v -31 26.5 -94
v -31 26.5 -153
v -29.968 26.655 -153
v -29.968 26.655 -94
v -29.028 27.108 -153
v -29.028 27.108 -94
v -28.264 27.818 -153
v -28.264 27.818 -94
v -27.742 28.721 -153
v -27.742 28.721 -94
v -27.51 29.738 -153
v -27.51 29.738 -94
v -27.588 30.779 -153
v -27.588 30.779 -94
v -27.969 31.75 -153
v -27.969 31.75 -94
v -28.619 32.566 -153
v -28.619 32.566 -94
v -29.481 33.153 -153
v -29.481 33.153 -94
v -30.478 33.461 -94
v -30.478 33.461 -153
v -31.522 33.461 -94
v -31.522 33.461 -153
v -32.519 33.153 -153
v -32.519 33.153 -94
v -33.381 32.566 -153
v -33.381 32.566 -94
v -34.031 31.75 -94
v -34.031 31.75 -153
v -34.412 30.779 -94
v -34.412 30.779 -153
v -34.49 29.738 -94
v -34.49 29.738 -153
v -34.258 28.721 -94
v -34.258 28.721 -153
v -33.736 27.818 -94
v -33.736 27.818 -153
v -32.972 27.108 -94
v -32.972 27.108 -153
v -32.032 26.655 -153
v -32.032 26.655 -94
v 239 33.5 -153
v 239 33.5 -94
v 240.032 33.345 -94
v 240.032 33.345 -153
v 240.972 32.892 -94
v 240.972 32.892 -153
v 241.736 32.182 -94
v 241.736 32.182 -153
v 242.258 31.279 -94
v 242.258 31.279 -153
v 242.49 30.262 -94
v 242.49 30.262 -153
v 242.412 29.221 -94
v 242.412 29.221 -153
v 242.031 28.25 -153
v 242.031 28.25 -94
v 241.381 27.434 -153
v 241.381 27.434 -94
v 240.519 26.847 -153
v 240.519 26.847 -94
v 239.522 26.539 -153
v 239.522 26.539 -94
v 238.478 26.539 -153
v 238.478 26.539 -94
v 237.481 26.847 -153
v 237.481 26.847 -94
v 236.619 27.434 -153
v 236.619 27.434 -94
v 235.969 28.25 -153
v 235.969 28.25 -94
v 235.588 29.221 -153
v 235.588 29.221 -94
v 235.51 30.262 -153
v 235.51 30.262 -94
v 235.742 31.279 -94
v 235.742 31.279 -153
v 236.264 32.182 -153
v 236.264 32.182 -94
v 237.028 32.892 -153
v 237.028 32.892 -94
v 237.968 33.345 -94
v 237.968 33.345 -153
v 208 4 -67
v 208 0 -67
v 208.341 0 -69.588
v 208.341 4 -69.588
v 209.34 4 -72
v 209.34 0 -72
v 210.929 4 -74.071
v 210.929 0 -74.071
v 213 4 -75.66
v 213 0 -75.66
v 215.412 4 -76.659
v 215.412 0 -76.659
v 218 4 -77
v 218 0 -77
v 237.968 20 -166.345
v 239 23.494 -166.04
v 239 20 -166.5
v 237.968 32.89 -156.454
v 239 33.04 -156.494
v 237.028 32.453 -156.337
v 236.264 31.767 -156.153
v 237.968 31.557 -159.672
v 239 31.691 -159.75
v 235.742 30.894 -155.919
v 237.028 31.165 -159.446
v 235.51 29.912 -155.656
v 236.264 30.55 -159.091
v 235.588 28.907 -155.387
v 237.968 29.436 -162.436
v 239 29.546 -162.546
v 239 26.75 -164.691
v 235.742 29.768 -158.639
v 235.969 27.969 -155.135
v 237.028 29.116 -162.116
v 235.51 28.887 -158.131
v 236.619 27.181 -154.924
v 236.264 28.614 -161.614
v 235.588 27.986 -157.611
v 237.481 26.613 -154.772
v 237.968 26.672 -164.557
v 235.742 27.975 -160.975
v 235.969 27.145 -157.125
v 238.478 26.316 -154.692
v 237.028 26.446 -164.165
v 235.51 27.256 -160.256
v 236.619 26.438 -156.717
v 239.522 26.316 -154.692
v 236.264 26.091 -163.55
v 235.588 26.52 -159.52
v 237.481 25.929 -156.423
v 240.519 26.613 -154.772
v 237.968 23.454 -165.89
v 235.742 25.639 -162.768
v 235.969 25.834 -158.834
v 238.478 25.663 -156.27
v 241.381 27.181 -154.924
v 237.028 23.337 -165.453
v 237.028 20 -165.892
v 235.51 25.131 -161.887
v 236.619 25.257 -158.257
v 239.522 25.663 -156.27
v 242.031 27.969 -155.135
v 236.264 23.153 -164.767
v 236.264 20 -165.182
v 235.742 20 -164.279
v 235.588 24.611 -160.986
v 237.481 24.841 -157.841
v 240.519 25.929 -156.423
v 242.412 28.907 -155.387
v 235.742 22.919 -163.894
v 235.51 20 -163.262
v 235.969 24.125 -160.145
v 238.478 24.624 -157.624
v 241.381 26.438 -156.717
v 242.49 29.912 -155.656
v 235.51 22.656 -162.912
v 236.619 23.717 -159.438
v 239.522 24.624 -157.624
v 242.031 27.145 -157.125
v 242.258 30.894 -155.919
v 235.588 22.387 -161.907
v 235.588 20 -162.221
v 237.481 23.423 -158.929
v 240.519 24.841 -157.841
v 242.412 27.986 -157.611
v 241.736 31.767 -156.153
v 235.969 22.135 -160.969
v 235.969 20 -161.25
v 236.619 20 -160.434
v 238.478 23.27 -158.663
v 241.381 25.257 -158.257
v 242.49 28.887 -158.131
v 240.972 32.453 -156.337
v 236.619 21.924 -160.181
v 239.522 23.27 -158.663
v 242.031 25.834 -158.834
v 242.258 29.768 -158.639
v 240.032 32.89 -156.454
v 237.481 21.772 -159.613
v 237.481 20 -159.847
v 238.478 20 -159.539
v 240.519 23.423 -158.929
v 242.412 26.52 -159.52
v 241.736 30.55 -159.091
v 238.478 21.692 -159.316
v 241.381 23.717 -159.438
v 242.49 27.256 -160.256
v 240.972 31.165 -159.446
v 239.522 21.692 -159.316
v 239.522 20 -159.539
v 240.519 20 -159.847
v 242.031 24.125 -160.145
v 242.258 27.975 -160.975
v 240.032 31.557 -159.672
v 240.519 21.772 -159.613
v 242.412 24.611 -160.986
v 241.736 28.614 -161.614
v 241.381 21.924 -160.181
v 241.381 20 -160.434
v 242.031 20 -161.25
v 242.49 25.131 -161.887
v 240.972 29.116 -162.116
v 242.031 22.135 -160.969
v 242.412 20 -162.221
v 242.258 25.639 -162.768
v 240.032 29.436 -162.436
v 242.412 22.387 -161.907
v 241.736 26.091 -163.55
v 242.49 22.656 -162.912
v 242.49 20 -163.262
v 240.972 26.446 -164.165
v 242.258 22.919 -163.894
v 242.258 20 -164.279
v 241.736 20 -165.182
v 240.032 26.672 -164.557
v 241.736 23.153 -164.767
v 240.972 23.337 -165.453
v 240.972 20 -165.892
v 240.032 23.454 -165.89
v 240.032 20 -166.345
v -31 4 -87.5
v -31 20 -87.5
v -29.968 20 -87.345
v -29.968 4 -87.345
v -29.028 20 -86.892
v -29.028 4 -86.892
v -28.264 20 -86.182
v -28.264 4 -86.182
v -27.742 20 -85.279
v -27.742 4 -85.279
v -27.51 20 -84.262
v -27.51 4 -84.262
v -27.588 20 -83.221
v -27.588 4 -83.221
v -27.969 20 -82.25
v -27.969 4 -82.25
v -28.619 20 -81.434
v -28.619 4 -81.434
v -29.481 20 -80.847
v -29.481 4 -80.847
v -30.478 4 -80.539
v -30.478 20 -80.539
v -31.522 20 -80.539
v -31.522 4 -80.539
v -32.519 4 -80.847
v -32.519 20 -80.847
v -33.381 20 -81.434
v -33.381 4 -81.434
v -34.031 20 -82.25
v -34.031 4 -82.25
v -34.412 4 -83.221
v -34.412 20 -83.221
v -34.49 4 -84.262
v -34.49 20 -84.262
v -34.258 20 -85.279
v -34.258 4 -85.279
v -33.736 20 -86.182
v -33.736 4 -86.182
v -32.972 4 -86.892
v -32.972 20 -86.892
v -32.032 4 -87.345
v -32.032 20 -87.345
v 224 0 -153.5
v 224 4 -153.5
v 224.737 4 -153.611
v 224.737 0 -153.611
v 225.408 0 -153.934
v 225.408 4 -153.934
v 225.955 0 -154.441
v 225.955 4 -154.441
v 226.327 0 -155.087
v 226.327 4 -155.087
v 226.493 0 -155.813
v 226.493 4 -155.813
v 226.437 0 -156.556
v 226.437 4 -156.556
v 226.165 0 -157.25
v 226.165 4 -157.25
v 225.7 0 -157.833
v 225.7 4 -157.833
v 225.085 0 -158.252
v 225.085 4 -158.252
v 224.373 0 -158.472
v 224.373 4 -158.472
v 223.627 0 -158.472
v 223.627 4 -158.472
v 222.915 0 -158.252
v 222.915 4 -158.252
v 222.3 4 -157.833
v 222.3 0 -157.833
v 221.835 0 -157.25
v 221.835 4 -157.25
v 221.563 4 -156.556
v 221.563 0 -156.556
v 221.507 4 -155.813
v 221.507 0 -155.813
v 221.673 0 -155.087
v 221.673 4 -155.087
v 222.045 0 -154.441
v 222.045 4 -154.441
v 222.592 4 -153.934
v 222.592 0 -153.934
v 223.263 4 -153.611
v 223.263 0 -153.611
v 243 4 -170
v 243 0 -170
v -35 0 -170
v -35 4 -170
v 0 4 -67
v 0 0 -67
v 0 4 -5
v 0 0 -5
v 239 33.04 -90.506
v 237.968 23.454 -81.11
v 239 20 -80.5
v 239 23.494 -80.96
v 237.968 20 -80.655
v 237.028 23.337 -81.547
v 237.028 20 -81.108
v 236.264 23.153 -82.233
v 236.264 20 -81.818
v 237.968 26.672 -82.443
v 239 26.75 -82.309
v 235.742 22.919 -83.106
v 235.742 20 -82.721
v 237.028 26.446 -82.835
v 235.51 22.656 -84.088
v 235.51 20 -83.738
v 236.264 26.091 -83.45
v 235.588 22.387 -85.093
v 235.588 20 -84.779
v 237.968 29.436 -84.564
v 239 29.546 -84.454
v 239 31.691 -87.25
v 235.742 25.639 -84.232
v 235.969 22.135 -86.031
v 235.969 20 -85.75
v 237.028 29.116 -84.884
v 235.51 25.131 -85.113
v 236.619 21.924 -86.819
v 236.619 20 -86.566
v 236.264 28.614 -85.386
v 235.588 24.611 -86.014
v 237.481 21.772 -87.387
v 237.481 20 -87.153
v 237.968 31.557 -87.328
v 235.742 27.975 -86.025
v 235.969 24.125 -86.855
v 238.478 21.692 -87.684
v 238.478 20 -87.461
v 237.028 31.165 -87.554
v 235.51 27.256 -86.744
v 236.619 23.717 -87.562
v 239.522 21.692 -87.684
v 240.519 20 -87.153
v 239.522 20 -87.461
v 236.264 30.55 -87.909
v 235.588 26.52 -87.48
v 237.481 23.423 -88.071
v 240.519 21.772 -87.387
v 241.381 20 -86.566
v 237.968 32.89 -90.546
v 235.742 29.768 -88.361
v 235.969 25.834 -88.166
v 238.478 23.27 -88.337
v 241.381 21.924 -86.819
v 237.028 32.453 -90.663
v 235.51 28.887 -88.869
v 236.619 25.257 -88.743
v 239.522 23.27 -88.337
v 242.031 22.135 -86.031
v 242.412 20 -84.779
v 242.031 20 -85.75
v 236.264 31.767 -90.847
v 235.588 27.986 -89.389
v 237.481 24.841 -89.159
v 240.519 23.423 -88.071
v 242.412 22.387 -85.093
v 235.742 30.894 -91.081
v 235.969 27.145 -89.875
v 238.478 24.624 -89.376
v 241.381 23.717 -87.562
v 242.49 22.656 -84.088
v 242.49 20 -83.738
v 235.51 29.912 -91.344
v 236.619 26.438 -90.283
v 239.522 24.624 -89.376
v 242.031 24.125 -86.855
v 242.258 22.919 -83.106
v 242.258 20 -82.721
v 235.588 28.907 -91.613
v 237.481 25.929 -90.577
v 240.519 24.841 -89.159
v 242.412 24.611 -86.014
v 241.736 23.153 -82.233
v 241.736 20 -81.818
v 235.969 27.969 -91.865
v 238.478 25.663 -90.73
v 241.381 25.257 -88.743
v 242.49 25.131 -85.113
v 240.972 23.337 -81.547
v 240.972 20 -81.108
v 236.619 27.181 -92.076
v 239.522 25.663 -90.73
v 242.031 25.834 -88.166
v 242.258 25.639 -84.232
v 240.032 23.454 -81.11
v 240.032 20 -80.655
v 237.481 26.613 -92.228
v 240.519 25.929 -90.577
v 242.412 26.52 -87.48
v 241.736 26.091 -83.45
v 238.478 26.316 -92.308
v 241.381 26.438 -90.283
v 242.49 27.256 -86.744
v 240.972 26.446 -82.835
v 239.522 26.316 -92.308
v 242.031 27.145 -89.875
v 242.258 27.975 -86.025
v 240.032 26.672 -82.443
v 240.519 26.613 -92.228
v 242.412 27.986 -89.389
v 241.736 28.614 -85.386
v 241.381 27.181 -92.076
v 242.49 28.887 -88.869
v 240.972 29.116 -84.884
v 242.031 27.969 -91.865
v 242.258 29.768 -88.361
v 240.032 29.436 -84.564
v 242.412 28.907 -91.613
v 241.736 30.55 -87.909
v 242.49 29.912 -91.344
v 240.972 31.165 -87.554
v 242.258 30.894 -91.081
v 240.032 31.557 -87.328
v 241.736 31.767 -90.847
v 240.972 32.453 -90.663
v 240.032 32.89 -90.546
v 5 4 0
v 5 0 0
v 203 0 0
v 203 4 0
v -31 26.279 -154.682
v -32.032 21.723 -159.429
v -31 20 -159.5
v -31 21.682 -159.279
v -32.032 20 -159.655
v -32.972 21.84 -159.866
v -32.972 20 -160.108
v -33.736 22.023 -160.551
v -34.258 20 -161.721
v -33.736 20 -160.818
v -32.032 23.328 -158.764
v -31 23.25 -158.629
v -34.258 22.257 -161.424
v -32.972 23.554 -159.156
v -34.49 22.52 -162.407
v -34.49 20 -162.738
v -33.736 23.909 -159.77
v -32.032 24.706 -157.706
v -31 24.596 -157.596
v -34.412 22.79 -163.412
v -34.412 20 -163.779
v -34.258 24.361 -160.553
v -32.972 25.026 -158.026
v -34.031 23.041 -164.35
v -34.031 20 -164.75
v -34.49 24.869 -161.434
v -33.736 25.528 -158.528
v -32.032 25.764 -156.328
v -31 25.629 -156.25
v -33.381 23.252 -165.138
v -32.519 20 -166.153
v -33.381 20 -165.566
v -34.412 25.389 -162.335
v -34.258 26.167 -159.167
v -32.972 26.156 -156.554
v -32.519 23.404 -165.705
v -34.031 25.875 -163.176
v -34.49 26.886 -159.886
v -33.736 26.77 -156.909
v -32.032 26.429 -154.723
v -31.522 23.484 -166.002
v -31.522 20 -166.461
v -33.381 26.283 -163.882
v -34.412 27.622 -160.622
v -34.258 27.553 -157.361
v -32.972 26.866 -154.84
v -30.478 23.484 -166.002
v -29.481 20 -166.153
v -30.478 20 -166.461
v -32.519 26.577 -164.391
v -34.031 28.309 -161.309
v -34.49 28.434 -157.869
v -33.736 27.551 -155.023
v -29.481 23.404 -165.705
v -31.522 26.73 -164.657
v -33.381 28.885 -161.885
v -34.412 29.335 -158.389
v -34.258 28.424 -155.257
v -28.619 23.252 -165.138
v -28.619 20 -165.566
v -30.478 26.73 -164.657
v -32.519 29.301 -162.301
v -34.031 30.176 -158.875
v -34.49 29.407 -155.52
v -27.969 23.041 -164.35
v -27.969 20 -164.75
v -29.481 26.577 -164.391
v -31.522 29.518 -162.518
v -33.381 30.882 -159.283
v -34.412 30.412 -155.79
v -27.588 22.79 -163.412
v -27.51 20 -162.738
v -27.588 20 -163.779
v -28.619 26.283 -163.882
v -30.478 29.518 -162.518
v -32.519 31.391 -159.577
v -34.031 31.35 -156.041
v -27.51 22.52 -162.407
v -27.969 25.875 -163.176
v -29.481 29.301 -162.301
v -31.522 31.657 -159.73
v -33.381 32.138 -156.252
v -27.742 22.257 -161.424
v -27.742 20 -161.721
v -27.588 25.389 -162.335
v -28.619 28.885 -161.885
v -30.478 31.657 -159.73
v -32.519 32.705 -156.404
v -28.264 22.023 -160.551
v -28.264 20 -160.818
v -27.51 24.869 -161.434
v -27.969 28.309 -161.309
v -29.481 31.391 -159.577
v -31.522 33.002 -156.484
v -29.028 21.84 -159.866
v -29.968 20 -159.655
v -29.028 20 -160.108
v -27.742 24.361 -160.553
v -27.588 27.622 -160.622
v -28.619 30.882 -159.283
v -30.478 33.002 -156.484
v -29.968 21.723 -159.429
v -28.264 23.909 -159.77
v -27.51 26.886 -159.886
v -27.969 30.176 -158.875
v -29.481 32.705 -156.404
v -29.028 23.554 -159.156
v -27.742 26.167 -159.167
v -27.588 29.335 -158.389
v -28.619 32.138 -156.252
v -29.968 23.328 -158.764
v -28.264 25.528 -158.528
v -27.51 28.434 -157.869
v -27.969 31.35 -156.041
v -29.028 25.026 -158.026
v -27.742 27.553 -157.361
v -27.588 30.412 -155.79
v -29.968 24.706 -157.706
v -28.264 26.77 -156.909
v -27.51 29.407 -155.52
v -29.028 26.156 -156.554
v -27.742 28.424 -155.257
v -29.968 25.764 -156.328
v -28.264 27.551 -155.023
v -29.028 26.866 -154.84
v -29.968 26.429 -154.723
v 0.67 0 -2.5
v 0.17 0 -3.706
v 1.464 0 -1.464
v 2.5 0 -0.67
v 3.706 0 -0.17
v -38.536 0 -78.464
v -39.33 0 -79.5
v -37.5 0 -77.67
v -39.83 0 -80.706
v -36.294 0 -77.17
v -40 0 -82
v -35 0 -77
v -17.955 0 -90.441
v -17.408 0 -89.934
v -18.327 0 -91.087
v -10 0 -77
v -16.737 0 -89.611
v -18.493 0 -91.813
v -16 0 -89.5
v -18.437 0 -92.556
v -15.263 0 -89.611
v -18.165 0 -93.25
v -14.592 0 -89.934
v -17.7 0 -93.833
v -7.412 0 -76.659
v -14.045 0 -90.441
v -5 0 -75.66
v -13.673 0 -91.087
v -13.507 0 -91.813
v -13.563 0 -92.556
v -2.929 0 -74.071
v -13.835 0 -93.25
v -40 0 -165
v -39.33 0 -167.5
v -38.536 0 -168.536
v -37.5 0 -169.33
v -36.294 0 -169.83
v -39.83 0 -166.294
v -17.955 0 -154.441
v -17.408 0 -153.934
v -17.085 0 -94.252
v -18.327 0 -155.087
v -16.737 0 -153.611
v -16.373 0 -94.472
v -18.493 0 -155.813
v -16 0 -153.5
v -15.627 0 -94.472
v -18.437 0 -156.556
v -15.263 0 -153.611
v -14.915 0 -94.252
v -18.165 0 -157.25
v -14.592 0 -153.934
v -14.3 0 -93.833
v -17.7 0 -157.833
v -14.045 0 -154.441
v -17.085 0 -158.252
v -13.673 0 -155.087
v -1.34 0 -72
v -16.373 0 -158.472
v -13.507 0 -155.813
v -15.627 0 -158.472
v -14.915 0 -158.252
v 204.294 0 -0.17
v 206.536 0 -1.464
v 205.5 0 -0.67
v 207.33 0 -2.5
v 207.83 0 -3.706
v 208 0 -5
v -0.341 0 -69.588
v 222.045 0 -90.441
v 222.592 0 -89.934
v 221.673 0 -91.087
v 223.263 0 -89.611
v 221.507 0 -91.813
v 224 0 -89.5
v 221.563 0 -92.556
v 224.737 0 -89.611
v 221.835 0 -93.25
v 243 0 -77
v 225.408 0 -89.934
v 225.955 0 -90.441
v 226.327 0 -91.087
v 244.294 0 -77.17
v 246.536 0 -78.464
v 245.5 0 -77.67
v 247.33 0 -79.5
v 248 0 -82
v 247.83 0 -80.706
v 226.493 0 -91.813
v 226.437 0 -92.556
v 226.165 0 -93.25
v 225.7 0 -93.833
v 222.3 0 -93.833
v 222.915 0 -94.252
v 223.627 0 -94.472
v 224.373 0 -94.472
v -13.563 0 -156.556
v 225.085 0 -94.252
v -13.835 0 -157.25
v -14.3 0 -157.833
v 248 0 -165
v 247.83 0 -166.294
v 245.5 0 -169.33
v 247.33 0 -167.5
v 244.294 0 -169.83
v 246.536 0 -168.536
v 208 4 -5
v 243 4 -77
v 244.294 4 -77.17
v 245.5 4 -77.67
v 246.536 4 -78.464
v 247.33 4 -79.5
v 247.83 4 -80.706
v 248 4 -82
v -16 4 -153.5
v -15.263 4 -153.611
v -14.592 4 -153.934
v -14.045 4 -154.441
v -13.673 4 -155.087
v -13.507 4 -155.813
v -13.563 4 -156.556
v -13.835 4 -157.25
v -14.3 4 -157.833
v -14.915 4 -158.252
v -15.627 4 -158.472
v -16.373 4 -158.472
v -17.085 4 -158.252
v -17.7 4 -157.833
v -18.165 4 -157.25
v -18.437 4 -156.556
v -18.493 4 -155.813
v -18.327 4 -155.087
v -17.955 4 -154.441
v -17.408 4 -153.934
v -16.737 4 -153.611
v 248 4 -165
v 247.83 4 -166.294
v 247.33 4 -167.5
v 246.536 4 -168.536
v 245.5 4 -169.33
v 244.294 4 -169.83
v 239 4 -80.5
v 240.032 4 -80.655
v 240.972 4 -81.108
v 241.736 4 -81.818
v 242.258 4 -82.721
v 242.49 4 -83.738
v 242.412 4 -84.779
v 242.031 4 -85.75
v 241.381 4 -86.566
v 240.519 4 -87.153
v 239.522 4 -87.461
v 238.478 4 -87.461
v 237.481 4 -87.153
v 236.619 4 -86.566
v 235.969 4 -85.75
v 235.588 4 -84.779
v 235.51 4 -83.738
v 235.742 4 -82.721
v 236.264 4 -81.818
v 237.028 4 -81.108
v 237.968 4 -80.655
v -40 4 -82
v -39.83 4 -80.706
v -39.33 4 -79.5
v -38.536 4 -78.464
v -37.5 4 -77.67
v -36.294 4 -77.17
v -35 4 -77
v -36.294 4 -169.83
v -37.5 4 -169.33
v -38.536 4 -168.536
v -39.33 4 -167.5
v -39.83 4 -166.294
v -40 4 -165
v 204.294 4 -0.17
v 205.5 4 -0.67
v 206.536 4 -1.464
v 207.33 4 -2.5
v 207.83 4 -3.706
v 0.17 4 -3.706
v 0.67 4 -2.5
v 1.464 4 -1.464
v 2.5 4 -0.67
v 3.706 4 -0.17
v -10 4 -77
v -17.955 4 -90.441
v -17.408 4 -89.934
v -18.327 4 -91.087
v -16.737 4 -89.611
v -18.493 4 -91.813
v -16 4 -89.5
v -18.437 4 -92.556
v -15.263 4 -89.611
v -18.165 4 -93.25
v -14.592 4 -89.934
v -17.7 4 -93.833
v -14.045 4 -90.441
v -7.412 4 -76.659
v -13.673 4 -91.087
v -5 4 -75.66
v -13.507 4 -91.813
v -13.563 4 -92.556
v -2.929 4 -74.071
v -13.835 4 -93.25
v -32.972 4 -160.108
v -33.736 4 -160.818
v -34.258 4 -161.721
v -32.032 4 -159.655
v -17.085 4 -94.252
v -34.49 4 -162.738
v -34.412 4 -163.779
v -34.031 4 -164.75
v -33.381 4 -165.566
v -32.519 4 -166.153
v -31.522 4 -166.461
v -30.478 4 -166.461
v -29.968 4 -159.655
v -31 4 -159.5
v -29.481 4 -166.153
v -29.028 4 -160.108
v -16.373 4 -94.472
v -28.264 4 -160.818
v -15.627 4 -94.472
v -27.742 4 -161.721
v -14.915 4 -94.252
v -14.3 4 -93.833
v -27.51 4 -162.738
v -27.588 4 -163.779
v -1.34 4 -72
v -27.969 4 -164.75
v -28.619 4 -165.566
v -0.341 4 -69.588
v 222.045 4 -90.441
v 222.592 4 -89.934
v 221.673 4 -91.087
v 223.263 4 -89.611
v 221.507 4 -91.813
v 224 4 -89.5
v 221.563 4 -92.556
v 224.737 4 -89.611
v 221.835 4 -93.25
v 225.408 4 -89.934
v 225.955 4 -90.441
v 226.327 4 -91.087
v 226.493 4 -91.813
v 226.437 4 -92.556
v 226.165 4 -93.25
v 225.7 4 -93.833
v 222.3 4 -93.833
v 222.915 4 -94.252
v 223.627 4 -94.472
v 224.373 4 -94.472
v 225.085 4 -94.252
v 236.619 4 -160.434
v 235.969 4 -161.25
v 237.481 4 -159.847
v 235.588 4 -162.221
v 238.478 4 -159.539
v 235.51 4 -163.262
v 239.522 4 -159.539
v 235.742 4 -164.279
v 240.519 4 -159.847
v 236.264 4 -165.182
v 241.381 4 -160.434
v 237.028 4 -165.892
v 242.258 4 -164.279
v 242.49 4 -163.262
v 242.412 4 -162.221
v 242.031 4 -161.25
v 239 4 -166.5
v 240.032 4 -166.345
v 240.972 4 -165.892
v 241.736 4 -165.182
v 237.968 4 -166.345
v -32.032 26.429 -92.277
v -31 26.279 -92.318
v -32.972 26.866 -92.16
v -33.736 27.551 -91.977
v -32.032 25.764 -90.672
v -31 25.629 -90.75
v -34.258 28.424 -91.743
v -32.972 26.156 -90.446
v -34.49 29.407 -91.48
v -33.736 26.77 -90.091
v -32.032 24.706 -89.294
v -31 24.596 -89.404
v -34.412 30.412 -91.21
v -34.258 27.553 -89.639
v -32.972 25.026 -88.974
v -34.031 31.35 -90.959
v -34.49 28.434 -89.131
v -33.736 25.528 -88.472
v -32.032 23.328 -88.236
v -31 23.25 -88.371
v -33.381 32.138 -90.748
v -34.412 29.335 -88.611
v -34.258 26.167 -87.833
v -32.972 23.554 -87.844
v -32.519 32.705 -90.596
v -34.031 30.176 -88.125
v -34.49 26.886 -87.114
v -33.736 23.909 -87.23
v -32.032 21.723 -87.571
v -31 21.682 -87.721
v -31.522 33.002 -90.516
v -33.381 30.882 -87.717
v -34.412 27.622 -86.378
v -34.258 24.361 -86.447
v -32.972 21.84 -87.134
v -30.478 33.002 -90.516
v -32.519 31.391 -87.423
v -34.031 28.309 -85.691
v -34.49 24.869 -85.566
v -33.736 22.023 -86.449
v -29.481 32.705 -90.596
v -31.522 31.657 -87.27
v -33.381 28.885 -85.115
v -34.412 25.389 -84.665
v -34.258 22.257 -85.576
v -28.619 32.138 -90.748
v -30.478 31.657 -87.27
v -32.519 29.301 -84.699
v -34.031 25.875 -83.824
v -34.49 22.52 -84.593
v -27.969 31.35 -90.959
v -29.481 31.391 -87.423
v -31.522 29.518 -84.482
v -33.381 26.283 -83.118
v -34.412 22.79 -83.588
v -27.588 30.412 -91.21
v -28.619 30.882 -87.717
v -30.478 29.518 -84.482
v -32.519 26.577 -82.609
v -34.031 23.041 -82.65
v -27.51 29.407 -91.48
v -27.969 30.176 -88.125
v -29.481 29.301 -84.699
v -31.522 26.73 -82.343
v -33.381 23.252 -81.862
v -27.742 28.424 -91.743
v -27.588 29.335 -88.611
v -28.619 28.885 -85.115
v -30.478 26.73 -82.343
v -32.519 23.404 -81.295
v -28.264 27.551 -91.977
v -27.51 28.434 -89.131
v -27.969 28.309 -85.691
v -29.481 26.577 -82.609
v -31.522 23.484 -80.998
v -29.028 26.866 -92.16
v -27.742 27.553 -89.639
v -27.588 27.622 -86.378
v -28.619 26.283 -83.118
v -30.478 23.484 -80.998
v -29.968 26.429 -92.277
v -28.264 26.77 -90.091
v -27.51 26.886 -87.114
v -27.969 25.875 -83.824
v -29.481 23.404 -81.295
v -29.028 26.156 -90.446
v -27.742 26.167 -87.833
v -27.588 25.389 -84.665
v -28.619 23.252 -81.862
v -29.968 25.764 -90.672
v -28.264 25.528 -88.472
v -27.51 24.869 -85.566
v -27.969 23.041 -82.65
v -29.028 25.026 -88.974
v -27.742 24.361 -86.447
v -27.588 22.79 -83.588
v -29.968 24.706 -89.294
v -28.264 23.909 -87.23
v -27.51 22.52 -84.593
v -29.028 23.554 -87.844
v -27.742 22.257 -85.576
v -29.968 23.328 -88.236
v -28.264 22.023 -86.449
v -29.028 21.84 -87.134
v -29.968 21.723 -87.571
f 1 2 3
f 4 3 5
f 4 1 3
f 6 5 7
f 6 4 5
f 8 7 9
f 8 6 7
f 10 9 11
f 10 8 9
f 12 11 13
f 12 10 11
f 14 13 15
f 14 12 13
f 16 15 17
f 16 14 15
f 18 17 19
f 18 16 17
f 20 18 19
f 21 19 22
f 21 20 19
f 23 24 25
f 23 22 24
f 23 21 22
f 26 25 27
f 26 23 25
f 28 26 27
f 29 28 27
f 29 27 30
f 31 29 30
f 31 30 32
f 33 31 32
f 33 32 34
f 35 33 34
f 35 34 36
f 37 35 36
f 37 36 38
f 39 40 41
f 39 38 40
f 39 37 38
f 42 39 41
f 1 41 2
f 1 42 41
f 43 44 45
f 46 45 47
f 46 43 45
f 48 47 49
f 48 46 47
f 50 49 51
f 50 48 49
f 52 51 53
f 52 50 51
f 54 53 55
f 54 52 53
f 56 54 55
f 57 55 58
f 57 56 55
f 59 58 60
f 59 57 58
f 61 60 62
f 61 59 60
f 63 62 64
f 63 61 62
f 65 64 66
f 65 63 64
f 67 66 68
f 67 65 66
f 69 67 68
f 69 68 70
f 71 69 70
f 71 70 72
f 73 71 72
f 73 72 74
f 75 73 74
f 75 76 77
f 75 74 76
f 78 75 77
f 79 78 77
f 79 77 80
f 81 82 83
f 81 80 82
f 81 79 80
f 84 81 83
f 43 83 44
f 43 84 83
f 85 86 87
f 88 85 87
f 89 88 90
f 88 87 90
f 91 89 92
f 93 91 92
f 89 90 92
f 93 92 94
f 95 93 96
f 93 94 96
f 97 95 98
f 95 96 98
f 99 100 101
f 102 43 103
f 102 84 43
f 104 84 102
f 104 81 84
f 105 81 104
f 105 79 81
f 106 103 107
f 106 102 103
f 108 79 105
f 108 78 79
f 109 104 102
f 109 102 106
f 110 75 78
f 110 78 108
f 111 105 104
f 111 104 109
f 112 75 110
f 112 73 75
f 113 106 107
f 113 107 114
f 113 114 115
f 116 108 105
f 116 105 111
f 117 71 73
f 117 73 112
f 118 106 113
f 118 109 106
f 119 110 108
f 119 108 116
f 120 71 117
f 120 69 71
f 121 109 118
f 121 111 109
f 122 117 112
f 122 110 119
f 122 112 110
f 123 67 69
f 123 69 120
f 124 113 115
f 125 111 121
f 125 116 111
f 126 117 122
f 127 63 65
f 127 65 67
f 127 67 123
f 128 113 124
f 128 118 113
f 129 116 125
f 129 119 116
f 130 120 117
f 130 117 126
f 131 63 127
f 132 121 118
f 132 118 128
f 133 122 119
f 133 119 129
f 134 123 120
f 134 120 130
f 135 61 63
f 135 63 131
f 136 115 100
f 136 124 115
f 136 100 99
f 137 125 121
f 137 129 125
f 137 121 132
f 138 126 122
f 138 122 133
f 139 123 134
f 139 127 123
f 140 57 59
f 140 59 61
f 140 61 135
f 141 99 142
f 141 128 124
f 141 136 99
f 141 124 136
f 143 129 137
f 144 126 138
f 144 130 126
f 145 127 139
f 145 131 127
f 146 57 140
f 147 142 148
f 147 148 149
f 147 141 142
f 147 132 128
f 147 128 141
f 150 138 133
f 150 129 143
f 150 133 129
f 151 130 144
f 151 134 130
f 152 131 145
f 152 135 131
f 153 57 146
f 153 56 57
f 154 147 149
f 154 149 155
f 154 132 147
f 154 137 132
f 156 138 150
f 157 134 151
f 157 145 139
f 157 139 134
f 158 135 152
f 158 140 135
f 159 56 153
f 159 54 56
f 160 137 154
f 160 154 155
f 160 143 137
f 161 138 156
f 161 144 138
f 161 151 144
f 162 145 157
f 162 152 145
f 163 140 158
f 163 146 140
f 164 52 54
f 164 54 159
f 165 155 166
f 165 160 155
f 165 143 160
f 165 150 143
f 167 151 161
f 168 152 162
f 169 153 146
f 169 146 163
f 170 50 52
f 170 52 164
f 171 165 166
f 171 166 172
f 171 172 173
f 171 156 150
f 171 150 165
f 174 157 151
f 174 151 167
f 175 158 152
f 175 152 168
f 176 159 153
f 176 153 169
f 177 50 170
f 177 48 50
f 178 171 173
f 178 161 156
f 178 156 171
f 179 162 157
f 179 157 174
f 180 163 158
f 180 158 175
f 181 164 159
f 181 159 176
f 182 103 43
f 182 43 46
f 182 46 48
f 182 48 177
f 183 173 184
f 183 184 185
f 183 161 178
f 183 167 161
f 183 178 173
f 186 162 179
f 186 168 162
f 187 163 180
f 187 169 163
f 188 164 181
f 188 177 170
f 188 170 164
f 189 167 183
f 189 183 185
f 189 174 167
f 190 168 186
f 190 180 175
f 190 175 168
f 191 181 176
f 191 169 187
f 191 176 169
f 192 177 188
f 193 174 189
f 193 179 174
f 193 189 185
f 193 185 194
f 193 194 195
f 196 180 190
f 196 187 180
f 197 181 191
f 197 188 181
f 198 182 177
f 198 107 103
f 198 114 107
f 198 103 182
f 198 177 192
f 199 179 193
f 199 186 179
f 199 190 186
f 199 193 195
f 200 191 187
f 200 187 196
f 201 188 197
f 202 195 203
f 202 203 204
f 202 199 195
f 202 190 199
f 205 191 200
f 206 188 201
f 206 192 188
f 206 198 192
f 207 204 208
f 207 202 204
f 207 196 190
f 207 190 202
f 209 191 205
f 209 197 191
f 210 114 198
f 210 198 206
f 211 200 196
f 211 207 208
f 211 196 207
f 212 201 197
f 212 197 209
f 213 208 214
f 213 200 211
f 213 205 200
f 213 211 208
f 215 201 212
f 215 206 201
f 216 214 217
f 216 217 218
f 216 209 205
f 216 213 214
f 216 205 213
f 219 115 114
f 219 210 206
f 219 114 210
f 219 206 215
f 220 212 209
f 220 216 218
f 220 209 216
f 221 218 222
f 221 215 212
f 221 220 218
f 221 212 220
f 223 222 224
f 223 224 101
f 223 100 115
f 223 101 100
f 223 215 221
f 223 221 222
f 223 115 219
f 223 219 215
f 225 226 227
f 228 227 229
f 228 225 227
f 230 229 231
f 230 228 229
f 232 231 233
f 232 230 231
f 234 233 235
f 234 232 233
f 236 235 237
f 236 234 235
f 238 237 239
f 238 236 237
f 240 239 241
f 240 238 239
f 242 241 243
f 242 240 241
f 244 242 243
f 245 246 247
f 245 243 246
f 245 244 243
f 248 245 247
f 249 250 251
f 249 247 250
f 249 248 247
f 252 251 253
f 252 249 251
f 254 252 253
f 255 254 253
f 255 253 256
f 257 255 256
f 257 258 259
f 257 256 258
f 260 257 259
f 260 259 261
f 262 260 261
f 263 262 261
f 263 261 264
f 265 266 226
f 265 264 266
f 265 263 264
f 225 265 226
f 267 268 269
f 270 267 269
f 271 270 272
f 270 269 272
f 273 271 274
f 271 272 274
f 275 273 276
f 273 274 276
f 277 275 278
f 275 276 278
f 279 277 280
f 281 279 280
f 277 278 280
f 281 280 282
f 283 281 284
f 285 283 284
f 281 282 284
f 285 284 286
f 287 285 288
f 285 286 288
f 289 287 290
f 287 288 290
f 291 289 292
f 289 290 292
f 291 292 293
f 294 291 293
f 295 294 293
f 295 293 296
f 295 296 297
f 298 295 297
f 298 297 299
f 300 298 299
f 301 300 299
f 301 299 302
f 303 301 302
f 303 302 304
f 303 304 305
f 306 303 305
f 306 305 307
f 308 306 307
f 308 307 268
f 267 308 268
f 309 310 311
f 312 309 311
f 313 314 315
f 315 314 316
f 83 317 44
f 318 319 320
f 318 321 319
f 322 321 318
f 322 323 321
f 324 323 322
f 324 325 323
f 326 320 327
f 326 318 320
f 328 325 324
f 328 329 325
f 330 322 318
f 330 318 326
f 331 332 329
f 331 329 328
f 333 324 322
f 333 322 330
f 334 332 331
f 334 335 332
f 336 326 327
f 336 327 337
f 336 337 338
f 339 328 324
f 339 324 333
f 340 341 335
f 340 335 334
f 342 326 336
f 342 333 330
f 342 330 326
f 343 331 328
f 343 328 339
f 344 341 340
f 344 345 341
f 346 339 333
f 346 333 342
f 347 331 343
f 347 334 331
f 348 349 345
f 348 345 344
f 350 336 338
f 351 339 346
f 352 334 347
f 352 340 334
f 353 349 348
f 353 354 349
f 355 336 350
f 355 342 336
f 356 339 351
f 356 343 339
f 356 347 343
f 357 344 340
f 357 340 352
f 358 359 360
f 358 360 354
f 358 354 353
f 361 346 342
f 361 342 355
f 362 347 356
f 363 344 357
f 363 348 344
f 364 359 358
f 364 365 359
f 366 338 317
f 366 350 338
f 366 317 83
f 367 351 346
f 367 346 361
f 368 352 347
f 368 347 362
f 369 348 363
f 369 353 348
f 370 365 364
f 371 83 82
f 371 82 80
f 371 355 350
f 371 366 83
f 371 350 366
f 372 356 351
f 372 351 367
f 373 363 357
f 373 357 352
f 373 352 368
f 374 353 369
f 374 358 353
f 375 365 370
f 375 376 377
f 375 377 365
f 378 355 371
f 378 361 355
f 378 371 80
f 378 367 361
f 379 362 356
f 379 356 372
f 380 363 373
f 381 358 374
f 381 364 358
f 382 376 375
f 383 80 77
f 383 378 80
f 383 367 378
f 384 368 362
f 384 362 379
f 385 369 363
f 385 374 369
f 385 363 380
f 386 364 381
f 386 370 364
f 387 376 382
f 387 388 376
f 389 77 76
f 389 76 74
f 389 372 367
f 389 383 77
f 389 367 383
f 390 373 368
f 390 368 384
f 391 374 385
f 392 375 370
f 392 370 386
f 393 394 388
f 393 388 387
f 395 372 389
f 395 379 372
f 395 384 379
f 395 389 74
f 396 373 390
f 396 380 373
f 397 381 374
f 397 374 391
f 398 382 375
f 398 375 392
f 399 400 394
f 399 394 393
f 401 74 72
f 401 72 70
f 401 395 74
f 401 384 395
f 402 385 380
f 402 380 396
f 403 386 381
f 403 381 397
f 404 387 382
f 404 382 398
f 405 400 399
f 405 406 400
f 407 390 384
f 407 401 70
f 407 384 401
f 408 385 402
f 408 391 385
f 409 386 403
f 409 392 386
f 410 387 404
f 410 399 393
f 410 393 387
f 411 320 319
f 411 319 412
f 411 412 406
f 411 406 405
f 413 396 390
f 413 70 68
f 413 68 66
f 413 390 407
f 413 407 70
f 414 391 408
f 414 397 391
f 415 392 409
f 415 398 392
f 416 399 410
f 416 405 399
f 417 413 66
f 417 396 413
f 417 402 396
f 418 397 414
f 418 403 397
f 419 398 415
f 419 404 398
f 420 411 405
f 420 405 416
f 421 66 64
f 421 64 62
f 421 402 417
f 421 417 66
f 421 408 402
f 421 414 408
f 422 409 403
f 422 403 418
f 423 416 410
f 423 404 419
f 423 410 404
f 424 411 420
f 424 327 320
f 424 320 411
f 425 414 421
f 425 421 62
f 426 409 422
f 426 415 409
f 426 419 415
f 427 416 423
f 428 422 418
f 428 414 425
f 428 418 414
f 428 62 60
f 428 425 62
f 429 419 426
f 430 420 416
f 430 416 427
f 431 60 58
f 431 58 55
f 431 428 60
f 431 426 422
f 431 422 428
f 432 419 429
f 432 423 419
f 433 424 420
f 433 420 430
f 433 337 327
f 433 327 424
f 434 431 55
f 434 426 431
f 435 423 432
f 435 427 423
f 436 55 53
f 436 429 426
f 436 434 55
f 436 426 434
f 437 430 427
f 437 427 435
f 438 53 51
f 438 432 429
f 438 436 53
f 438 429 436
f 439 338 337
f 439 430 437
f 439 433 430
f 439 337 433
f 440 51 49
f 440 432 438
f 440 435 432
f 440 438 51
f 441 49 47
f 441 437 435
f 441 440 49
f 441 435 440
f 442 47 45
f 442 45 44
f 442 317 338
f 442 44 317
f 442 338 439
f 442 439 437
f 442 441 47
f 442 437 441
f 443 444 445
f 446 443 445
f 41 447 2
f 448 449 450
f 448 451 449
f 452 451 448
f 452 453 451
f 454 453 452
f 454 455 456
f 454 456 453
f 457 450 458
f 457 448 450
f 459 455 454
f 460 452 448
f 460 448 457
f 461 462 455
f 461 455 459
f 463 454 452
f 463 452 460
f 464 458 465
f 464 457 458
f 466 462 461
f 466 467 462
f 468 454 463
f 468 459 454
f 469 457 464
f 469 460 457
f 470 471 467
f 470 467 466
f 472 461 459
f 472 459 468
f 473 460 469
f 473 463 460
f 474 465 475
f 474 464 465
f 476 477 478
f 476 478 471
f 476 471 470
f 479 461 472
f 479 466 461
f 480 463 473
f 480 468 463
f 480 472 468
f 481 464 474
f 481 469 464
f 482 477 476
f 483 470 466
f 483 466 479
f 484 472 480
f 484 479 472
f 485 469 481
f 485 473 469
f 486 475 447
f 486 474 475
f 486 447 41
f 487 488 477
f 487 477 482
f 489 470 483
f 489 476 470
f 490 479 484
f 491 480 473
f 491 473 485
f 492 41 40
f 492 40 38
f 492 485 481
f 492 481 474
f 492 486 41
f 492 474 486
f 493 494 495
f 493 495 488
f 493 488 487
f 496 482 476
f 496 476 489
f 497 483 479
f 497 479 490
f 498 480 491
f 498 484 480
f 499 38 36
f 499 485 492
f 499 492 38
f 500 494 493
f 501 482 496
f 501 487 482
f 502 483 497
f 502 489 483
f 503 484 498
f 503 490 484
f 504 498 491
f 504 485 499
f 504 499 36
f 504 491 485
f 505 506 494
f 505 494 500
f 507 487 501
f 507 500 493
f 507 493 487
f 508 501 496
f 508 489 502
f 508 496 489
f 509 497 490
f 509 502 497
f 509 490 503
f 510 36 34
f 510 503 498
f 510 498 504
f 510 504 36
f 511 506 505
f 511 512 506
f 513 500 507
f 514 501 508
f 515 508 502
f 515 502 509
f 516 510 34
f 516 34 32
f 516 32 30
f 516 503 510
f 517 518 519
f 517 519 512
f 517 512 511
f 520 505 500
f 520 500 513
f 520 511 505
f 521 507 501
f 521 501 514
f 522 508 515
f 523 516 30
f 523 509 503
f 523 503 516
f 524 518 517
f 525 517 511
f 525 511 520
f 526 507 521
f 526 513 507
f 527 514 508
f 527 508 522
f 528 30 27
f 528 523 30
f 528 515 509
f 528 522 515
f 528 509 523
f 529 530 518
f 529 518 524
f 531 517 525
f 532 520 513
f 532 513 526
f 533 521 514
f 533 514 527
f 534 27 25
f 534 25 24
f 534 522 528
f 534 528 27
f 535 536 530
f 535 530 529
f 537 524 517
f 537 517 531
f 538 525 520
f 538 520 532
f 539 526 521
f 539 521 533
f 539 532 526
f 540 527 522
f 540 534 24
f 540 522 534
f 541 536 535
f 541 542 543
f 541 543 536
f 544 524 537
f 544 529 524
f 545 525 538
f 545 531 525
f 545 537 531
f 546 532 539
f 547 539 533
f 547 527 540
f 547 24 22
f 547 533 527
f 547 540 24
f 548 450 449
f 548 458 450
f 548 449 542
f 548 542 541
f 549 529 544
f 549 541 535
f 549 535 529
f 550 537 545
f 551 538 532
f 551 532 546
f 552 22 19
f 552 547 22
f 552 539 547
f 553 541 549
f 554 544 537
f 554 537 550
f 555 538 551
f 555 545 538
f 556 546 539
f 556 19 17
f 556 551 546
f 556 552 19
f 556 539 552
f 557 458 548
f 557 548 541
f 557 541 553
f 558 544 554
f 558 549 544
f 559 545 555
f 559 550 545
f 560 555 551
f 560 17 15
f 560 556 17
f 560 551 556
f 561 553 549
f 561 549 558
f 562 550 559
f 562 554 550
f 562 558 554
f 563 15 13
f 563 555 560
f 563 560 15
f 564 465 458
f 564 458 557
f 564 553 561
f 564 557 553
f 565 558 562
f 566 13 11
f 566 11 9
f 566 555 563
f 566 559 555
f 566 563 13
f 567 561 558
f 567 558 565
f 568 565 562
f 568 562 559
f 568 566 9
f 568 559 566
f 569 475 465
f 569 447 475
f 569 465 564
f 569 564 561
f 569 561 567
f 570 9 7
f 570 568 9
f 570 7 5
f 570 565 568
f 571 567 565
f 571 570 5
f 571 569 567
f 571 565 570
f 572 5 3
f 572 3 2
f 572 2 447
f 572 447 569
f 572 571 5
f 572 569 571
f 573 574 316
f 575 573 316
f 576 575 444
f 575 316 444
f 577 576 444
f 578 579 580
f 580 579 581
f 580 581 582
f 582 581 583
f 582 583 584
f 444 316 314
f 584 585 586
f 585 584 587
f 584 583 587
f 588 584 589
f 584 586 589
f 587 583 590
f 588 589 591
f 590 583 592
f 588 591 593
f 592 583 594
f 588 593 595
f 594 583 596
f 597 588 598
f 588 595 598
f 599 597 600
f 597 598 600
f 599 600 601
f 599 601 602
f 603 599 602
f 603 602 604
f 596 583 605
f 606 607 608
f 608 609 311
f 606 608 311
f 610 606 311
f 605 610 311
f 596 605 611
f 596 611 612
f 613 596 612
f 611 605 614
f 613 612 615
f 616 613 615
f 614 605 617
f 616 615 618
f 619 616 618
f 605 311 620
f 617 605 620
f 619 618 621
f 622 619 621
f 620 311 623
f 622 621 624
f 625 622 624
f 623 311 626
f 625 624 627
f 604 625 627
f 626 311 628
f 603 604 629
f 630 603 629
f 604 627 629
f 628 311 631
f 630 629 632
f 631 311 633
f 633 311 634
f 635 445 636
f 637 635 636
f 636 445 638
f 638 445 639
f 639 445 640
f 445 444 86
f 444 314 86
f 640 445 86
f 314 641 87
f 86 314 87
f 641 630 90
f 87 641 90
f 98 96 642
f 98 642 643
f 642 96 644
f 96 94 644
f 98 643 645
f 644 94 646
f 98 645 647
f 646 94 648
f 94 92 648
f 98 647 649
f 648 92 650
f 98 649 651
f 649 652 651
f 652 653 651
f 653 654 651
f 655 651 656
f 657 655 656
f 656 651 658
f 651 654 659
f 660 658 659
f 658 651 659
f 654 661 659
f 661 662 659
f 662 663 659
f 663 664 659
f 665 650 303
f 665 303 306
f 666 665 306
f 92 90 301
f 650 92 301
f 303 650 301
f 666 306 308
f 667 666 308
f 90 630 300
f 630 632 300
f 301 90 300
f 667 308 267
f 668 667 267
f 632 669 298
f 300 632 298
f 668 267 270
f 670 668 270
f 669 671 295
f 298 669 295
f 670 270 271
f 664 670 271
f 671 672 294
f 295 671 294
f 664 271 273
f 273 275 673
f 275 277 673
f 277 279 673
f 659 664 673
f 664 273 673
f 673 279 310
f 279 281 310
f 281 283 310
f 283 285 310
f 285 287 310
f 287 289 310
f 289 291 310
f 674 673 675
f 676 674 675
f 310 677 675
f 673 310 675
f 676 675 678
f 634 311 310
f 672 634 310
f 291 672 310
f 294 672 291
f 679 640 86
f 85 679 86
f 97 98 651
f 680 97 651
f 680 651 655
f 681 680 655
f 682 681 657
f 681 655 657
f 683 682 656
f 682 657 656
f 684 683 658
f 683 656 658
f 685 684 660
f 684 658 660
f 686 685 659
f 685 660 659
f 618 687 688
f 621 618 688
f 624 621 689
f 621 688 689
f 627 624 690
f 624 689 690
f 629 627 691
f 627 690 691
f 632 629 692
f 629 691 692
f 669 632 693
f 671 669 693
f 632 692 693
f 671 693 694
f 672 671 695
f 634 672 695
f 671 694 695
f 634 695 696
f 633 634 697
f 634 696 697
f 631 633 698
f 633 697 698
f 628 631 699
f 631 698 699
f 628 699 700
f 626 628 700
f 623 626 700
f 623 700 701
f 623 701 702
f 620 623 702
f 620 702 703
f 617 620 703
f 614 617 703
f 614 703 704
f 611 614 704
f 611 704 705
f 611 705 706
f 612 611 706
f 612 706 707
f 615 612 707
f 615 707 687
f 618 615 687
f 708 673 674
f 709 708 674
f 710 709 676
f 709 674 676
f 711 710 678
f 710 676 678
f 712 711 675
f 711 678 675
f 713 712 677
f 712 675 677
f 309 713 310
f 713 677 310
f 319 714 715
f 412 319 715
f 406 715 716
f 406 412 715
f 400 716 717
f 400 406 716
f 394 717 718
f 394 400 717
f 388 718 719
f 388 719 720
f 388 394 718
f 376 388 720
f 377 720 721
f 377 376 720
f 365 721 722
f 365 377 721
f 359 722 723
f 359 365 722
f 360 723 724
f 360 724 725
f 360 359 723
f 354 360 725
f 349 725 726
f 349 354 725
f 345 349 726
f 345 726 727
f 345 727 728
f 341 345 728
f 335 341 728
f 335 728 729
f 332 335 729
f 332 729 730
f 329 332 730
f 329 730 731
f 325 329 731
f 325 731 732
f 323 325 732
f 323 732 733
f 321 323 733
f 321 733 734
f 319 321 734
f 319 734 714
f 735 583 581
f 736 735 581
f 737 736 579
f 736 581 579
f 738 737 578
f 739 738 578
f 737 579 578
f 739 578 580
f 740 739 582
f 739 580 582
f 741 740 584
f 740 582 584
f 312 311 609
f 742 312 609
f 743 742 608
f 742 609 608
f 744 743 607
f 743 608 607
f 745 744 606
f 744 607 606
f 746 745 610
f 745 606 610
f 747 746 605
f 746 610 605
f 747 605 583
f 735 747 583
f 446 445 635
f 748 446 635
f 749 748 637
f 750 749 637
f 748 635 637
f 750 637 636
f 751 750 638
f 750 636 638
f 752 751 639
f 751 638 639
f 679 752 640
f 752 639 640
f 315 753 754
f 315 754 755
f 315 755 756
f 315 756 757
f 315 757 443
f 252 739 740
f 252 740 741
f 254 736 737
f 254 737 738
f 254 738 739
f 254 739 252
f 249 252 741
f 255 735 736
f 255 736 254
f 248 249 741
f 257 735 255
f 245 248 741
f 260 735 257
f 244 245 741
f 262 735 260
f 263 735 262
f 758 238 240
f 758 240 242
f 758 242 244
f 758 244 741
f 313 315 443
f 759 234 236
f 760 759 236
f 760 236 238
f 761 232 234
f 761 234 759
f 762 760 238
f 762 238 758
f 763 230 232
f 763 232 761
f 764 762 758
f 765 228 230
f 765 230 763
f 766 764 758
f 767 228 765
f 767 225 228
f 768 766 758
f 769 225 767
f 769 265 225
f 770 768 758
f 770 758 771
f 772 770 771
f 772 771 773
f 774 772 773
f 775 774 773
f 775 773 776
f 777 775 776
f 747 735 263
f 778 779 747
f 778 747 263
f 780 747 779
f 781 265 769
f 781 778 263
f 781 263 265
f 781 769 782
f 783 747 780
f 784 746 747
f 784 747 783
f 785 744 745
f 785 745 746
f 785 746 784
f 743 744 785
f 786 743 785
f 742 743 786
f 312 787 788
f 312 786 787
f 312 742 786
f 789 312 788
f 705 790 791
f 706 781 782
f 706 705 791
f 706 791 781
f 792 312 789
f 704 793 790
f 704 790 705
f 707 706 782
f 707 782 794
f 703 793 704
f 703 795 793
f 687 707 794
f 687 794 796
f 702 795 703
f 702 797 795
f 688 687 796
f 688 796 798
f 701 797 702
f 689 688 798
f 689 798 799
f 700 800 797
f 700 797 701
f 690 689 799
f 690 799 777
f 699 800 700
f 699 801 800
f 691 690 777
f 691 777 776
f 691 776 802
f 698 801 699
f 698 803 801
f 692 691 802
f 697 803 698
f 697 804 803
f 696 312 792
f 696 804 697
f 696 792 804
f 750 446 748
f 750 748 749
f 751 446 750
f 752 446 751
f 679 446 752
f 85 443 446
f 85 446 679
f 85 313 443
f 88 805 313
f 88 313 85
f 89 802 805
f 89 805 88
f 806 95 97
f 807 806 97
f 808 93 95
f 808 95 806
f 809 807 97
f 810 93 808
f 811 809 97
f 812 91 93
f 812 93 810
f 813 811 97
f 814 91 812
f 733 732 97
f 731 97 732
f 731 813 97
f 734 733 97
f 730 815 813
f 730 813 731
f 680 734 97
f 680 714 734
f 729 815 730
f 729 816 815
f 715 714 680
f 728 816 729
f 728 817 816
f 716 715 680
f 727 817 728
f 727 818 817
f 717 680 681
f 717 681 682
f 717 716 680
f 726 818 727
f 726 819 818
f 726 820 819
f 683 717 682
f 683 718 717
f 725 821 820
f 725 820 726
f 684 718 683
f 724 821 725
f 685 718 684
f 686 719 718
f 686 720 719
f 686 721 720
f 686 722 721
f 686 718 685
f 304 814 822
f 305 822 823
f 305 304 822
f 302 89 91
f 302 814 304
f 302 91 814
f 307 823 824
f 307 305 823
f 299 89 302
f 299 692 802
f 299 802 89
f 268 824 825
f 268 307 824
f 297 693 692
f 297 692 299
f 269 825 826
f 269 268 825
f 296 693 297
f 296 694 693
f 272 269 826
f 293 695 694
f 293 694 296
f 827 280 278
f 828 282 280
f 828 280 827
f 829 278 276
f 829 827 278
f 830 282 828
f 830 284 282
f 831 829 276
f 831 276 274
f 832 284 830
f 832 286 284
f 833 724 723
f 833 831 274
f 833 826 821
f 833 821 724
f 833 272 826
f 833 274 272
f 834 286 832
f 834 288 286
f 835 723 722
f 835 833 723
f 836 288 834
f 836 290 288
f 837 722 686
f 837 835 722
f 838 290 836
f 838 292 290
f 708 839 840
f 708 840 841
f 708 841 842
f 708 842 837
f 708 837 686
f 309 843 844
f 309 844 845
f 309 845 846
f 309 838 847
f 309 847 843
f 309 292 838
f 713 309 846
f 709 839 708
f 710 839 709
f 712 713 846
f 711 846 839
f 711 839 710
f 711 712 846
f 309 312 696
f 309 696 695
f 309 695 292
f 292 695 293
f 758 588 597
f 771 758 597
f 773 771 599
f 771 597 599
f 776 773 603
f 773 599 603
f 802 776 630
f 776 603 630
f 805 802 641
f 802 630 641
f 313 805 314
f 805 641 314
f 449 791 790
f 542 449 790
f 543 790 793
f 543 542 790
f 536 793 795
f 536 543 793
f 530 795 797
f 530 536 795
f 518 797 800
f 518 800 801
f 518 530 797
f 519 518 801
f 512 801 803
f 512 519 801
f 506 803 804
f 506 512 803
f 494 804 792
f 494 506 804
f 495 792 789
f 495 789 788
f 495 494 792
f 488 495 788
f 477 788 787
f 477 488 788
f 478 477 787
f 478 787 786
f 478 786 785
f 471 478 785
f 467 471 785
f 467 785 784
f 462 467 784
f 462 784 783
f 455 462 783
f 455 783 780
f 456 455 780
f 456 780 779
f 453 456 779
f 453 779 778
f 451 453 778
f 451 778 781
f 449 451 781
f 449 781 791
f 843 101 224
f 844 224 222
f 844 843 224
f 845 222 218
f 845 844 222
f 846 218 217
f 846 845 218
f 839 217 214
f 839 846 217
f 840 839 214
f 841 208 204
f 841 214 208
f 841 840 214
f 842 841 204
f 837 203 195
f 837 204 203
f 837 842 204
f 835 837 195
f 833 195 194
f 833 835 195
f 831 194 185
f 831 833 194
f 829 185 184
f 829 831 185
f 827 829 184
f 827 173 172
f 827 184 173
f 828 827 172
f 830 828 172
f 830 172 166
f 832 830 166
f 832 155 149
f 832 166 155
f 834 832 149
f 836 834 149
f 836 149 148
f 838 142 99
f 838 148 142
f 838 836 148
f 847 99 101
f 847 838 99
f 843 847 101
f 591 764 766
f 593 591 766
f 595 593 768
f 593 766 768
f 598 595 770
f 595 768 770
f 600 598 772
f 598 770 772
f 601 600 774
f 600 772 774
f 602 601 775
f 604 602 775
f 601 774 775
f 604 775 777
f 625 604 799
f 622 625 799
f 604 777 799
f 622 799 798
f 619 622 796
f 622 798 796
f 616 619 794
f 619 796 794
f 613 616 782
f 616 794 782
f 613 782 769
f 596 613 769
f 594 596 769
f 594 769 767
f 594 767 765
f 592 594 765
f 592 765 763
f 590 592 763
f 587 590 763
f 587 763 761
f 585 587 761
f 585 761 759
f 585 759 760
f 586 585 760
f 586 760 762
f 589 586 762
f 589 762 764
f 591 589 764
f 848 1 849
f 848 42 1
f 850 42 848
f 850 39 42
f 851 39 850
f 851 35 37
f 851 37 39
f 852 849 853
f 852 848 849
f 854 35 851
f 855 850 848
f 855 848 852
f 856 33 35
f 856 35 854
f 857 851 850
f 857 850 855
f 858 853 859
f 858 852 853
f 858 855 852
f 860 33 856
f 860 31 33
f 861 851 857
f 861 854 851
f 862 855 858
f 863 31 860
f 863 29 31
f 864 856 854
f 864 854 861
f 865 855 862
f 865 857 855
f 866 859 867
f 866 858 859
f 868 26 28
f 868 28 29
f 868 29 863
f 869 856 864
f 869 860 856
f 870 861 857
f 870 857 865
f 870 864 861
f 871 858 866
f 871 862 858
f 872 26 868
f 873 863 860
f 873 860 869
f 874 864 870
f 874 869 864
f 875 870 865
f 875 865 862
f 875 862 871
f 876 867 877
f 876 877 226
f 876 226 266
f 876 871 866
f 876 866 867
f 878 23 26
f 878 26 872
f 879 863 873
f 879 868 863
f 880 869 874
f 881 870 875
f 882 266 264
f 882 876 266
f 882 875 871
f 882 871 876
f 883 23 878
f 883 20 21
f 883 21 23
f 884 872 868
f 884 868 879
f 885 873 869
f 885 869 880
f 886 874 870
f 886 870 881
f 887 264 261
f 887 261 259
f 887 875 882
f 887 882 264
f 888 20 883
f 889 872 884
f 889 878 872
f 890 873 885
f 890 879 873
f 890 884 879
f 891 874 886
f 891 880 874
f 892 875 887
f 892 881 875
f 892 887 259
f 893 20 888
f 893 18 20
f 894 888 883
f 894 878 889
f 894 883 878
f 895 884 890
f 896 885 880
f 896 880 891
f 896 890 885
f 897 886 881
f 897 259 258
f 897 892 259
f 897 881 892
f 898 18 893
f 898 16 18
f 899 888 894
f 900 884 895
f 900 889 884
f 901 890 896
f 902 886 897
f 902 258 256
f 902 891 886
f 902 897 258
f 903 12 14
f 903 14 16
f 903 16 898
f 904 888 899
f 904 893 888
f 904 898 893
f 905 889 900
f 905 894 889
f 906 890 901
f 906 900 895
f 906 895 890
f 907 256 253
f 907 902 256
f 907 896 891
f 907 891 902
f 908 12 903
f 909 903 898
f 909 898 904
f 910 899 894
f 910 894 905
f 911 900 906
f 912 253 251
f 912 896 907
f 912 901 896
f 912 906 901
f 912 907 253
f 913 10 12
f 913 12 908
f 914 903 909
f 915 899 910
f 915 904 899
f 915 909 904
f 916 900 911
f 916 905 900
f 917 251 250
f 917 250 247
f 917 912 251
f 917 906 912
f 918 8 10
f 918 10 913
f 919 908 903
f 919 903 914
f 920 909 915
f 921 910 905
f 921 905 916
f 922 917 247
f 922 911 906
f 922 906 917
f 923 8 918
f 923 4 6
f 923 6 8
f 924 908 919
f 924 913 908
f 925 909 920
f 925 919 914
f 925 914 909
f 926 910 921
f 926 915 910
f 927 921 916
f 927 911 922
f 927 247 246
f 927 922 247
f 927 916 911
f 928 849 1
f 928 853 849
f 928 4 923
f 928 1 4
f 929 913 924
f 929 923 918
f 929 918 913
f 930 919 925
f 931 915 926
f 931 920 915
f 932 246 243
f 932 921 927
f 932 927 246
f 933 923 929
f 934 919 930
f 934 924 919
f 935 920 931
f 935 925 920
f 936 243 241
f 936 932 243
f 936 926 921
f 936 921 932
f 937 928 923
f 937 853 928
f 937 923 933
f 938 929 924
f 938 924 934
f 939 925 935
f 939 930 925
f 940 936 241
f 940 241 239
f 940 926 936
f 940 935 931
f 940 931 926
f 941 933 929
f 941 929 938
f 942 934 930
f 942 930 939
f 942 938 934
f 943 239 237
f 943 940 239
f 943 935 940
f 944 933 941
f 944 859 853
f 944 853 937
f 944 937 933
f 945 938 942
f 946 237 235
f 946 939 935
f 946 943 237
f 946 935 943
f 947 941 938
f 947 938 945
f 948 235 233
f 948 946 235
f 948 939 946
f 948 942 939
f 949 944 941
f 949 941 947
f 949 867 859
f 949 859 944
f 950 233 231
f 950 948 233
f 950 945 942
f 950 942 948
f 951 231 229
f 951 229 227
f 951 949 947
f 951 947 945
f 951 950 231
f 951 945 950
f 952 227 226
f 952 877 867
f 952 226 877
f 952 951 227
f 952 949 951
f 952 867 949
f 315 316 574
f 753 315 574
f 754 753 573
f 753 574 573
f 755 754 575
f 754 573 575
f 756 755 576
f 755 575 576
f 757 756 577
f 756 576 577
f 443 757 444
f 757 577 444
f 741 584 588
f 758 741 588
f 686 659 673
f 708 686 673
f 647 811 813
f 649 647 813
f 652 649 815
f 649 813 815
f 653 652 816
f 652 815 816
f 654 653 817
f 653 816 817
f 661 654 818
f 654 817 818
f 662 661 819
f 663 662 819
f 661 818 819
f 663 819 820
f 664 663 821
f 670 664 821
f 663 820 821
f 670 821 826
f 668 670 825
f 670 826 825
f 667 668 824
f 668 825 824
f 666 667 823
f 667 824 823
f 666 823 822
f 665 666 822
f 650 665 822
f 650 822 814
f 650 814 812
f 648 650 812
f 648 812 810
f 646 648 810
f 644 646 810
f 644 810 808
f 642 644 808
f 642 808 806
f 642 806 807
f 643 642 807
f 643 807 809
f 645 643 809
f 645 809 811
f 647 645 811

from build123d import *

# Parameters (mm, degrees)
BOSS_EXTRU_1_DEPTH      = 4
BALAYAGE13_PROFILE_R    = 3.5
BALAYAGE14_PROFILE_R    = 3.5
ESQUISSE34_R            = 2.5
ENL_V_MAT_EXTRU_1_DEPTH = 10


with BuildPart() as part:
    # Esquisse1 → Boss.-Extru.1 (new body)
    with BuildSketch(Plane(origin=(0, 0, 0), x_dir=(1, 0, 0), z_dir=(0, 1, 0))):
        with BuildLine():
            Line((5, 0), (203, 0))
            ThreePointArc((203, 0), (206.535533906, 1.464466094), (208, 5))
            Line((208, 5), (208, 67))
            ThreePointArc((208, 67), (210.928932188, 74.071067812), (218, 77))
            Line((218, 77), (243, 77))
            ThreePointArc((243, 77), (246.535533906, 78.464466094), (248, 82))
            Line((248, 82), (248, 165))
            ThreePointArc((248, 165), (246.535533906, 168.535533906), (243, 170))
            Line((243, 170), (-35, 170))
            ThreePointArc((-35, 170), (-38.535533906, 168.535533906), (-40, 165))
            Line((-40, 165), (-40, 82))
            ThreePointArc((-40, 82), (-38.535533906, 78.464466094), (-35, 77))
            Line((-35, 77), (-10, 77))
            ThreePointArc((-10, 77), (-2.928932188, 74.071067812), (0, 67))
            Line((0, 67), (0, 5))
            ThreePointArc((0, 5), (1.464466094, 1.464466094), (5, 0))
        make_face()
    extrude(amount=BOSS_EXTRU_1_DEPTH)

    # Balayage13: sweep along a path in Esquisse12
    with BuildLine(Plane(origin=(239, 0, 0), x_dir=(0, 0, -1), z_dir=(1, 0, 0))) as balayage13_path:
        Line((84, 4), (84, 20))
        ThreePointArc((84, 20), (86.928932188, 27.071067812), (94, 30))
        Line((94, 30), (153, 30))
        ThreePointArc((153, 30), (160.071067812, 27.071067812), (163, 20))
        Line((163, 20), (163, 4))
    # Balayage13 profile (on start of the path) → Balayage13 (sweep)
    with BuildSketch(Plane(origin=(239, 4, -84), x_dir=(0, 0, 1), z_dir=(0, 1, 0))):
        Circle(BALAYAGE13_PROFILE_R)
    sweep(path=balayage13_path.line)

    # Balayage14: sweep along a path in Esquisse33
    with BuildLine(Plane.ZY.offset(31)) as balayage14_path:
        Line((-163, 4), (-163, 20))
        ThreePointArc((-163, 20), (-160.071067812, 27.071067812), (-153, 30))
        Line((-153, 30), (-94, 30))
        ThreePointArc((-94, 30), (-86.928932188, 27.071067812), (-84, 20))
        Line((-84, 20), (-84, 4))
    # Balayage14 profile (on start of the path) → Balayage14 (sweep)
    with BuildSketch(Plane(origin=(-31, 4, -163), x_dir=(0, 0, 1), z_dir=(0, 1, 0))):
        Circle(BALAYAGE14_PROFILE_R)
    sweep(path=balayage14_path.line)

    # Esquisse34 → Enlèv. mat.-Extru.1 (cut)
    with BuildSketch(Plane(origin=(0, 4, 0), x_dir=(1, 0, 0), z_dir=(0, 1, 0))):
        with Locations(Location((-16, 156, 0), (0, 0, 270))):
            Circle(ESQUISSE34_R)
        with Locations(Location((224, 156, 0), (0, 0, 270))):
            Circle(ESQUISSE34_R)
        with Locations(Location((-16, 92, 0), (0, 0, 270))):
            Circle(ESQUISSE34_R)
        with Locations(Location((224, 92, 0), (0, 0, 270))):
            Circle(ESQUISSE34_R)
    extrude(amount=-ENL_V_MAT_EXTRU_1_DEPTH, mode=Mode.SUBTRACT)


solid = part.part
